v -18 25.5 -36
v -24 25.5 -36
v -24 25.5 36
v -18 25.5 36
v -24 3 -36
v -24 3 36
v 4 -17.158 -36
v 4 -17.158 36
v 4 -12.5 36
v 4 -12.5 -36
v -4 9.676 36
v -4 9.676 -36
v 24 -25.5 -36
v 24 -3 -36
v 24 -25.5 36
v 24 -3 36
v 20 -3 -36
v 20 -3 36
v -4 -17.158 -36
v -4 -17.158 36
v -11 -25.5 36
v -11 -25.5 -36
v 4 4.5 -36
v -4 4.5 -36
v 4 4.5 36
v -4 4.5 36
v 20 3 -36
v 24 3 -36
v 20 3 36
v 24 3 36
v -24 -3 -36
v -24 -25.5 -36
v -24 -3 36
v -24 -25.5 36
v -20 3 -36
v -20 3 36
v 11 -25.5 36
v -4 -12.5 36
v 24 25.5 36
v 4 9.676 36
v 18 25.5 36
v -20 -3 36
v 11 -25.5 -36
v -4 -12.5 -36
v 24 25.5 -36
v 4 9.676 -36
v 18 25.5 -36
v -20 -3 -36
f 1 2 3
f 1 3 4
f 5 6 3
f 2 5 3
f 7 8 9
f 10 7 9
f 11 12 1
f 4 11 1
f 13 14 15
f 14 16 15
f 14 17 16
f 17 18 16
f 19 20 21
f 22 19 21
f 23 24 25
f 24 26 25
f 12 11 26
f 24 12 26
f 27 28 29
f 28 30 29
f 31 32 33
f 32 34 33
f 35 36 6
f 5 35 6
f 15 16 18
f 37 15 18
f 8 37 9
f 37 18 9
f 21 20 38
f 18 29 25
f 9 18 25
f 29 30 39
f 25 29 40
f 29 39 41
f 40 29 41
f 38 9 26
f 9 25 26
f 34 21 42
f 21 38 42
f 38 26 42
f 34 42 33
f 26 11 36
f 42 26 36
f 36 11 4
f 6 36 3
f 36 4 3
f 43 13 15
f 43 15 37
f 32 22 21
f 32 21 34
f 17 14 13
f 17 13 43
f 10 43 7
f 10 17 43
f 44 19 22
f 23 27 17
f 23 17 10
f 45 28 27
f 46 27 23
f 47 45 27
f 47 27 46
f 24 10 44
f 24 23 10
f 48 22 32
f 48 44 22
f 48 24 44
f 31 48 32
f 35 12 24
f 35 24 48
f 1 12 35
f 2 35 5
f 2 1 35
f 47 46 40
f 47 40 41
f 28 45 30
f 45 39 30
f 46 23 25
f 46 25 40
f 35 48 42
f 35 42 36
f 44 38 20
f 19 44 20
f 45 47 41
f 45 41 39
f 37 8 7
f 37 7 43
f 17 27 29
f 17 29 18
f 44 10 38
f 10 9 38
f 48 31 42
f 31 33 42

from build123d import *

# Parameters (mm, degrees)
BOSS_EXTRUDE1_DEPTH = 36
CUT_EXTRUDE1_DEPTH  = 81.06403687


with BuildPart() as part:
    # Sketch1 → Boss-Extrude1 (new, symmetric)
    with BuildSketch(Plane.XY):
        Polygon((-24, 25.5), (-4, 25.5), (-4, 4.5), (4, 4.5), (4, 25.5), (24, 25.5), (24, 3), (20, 3), (20, -3), (24, -3), (24, -25.5), (4, -25.5), (4, -12.5), (-4, -12.5), (-4, -25.5), (-24, -25.5), (-24, -3), (-20, -3), (-20, 3), (-24, 3), align=None)
    extrude(amount=BOSS_EXTRUDE1_DEPTH, both=True)

    # Sketch3 → Cut-Extrude1 (cut, through all)
    with BuildSketch(Plane.XY.offset(36)):
        Polygon((-4, 9.675878591), (-18, 25.5), (-4, 25.5), align=None)
        Polygon((4, 9.675878591), (18, 25.5), (4, 25.5), align=None)
        Polygon((4, -17.157724852), (11, -25.5), (4, -25.5), align=None)
        Polygon((-4, -17.157724852), (-11, -25.5), (-4, -25.5), align=None)
    extrude(amount=-CUT_EXTRUDE1_DEPTH, mode=Mode.SUBTRACT)


solid = part.part
